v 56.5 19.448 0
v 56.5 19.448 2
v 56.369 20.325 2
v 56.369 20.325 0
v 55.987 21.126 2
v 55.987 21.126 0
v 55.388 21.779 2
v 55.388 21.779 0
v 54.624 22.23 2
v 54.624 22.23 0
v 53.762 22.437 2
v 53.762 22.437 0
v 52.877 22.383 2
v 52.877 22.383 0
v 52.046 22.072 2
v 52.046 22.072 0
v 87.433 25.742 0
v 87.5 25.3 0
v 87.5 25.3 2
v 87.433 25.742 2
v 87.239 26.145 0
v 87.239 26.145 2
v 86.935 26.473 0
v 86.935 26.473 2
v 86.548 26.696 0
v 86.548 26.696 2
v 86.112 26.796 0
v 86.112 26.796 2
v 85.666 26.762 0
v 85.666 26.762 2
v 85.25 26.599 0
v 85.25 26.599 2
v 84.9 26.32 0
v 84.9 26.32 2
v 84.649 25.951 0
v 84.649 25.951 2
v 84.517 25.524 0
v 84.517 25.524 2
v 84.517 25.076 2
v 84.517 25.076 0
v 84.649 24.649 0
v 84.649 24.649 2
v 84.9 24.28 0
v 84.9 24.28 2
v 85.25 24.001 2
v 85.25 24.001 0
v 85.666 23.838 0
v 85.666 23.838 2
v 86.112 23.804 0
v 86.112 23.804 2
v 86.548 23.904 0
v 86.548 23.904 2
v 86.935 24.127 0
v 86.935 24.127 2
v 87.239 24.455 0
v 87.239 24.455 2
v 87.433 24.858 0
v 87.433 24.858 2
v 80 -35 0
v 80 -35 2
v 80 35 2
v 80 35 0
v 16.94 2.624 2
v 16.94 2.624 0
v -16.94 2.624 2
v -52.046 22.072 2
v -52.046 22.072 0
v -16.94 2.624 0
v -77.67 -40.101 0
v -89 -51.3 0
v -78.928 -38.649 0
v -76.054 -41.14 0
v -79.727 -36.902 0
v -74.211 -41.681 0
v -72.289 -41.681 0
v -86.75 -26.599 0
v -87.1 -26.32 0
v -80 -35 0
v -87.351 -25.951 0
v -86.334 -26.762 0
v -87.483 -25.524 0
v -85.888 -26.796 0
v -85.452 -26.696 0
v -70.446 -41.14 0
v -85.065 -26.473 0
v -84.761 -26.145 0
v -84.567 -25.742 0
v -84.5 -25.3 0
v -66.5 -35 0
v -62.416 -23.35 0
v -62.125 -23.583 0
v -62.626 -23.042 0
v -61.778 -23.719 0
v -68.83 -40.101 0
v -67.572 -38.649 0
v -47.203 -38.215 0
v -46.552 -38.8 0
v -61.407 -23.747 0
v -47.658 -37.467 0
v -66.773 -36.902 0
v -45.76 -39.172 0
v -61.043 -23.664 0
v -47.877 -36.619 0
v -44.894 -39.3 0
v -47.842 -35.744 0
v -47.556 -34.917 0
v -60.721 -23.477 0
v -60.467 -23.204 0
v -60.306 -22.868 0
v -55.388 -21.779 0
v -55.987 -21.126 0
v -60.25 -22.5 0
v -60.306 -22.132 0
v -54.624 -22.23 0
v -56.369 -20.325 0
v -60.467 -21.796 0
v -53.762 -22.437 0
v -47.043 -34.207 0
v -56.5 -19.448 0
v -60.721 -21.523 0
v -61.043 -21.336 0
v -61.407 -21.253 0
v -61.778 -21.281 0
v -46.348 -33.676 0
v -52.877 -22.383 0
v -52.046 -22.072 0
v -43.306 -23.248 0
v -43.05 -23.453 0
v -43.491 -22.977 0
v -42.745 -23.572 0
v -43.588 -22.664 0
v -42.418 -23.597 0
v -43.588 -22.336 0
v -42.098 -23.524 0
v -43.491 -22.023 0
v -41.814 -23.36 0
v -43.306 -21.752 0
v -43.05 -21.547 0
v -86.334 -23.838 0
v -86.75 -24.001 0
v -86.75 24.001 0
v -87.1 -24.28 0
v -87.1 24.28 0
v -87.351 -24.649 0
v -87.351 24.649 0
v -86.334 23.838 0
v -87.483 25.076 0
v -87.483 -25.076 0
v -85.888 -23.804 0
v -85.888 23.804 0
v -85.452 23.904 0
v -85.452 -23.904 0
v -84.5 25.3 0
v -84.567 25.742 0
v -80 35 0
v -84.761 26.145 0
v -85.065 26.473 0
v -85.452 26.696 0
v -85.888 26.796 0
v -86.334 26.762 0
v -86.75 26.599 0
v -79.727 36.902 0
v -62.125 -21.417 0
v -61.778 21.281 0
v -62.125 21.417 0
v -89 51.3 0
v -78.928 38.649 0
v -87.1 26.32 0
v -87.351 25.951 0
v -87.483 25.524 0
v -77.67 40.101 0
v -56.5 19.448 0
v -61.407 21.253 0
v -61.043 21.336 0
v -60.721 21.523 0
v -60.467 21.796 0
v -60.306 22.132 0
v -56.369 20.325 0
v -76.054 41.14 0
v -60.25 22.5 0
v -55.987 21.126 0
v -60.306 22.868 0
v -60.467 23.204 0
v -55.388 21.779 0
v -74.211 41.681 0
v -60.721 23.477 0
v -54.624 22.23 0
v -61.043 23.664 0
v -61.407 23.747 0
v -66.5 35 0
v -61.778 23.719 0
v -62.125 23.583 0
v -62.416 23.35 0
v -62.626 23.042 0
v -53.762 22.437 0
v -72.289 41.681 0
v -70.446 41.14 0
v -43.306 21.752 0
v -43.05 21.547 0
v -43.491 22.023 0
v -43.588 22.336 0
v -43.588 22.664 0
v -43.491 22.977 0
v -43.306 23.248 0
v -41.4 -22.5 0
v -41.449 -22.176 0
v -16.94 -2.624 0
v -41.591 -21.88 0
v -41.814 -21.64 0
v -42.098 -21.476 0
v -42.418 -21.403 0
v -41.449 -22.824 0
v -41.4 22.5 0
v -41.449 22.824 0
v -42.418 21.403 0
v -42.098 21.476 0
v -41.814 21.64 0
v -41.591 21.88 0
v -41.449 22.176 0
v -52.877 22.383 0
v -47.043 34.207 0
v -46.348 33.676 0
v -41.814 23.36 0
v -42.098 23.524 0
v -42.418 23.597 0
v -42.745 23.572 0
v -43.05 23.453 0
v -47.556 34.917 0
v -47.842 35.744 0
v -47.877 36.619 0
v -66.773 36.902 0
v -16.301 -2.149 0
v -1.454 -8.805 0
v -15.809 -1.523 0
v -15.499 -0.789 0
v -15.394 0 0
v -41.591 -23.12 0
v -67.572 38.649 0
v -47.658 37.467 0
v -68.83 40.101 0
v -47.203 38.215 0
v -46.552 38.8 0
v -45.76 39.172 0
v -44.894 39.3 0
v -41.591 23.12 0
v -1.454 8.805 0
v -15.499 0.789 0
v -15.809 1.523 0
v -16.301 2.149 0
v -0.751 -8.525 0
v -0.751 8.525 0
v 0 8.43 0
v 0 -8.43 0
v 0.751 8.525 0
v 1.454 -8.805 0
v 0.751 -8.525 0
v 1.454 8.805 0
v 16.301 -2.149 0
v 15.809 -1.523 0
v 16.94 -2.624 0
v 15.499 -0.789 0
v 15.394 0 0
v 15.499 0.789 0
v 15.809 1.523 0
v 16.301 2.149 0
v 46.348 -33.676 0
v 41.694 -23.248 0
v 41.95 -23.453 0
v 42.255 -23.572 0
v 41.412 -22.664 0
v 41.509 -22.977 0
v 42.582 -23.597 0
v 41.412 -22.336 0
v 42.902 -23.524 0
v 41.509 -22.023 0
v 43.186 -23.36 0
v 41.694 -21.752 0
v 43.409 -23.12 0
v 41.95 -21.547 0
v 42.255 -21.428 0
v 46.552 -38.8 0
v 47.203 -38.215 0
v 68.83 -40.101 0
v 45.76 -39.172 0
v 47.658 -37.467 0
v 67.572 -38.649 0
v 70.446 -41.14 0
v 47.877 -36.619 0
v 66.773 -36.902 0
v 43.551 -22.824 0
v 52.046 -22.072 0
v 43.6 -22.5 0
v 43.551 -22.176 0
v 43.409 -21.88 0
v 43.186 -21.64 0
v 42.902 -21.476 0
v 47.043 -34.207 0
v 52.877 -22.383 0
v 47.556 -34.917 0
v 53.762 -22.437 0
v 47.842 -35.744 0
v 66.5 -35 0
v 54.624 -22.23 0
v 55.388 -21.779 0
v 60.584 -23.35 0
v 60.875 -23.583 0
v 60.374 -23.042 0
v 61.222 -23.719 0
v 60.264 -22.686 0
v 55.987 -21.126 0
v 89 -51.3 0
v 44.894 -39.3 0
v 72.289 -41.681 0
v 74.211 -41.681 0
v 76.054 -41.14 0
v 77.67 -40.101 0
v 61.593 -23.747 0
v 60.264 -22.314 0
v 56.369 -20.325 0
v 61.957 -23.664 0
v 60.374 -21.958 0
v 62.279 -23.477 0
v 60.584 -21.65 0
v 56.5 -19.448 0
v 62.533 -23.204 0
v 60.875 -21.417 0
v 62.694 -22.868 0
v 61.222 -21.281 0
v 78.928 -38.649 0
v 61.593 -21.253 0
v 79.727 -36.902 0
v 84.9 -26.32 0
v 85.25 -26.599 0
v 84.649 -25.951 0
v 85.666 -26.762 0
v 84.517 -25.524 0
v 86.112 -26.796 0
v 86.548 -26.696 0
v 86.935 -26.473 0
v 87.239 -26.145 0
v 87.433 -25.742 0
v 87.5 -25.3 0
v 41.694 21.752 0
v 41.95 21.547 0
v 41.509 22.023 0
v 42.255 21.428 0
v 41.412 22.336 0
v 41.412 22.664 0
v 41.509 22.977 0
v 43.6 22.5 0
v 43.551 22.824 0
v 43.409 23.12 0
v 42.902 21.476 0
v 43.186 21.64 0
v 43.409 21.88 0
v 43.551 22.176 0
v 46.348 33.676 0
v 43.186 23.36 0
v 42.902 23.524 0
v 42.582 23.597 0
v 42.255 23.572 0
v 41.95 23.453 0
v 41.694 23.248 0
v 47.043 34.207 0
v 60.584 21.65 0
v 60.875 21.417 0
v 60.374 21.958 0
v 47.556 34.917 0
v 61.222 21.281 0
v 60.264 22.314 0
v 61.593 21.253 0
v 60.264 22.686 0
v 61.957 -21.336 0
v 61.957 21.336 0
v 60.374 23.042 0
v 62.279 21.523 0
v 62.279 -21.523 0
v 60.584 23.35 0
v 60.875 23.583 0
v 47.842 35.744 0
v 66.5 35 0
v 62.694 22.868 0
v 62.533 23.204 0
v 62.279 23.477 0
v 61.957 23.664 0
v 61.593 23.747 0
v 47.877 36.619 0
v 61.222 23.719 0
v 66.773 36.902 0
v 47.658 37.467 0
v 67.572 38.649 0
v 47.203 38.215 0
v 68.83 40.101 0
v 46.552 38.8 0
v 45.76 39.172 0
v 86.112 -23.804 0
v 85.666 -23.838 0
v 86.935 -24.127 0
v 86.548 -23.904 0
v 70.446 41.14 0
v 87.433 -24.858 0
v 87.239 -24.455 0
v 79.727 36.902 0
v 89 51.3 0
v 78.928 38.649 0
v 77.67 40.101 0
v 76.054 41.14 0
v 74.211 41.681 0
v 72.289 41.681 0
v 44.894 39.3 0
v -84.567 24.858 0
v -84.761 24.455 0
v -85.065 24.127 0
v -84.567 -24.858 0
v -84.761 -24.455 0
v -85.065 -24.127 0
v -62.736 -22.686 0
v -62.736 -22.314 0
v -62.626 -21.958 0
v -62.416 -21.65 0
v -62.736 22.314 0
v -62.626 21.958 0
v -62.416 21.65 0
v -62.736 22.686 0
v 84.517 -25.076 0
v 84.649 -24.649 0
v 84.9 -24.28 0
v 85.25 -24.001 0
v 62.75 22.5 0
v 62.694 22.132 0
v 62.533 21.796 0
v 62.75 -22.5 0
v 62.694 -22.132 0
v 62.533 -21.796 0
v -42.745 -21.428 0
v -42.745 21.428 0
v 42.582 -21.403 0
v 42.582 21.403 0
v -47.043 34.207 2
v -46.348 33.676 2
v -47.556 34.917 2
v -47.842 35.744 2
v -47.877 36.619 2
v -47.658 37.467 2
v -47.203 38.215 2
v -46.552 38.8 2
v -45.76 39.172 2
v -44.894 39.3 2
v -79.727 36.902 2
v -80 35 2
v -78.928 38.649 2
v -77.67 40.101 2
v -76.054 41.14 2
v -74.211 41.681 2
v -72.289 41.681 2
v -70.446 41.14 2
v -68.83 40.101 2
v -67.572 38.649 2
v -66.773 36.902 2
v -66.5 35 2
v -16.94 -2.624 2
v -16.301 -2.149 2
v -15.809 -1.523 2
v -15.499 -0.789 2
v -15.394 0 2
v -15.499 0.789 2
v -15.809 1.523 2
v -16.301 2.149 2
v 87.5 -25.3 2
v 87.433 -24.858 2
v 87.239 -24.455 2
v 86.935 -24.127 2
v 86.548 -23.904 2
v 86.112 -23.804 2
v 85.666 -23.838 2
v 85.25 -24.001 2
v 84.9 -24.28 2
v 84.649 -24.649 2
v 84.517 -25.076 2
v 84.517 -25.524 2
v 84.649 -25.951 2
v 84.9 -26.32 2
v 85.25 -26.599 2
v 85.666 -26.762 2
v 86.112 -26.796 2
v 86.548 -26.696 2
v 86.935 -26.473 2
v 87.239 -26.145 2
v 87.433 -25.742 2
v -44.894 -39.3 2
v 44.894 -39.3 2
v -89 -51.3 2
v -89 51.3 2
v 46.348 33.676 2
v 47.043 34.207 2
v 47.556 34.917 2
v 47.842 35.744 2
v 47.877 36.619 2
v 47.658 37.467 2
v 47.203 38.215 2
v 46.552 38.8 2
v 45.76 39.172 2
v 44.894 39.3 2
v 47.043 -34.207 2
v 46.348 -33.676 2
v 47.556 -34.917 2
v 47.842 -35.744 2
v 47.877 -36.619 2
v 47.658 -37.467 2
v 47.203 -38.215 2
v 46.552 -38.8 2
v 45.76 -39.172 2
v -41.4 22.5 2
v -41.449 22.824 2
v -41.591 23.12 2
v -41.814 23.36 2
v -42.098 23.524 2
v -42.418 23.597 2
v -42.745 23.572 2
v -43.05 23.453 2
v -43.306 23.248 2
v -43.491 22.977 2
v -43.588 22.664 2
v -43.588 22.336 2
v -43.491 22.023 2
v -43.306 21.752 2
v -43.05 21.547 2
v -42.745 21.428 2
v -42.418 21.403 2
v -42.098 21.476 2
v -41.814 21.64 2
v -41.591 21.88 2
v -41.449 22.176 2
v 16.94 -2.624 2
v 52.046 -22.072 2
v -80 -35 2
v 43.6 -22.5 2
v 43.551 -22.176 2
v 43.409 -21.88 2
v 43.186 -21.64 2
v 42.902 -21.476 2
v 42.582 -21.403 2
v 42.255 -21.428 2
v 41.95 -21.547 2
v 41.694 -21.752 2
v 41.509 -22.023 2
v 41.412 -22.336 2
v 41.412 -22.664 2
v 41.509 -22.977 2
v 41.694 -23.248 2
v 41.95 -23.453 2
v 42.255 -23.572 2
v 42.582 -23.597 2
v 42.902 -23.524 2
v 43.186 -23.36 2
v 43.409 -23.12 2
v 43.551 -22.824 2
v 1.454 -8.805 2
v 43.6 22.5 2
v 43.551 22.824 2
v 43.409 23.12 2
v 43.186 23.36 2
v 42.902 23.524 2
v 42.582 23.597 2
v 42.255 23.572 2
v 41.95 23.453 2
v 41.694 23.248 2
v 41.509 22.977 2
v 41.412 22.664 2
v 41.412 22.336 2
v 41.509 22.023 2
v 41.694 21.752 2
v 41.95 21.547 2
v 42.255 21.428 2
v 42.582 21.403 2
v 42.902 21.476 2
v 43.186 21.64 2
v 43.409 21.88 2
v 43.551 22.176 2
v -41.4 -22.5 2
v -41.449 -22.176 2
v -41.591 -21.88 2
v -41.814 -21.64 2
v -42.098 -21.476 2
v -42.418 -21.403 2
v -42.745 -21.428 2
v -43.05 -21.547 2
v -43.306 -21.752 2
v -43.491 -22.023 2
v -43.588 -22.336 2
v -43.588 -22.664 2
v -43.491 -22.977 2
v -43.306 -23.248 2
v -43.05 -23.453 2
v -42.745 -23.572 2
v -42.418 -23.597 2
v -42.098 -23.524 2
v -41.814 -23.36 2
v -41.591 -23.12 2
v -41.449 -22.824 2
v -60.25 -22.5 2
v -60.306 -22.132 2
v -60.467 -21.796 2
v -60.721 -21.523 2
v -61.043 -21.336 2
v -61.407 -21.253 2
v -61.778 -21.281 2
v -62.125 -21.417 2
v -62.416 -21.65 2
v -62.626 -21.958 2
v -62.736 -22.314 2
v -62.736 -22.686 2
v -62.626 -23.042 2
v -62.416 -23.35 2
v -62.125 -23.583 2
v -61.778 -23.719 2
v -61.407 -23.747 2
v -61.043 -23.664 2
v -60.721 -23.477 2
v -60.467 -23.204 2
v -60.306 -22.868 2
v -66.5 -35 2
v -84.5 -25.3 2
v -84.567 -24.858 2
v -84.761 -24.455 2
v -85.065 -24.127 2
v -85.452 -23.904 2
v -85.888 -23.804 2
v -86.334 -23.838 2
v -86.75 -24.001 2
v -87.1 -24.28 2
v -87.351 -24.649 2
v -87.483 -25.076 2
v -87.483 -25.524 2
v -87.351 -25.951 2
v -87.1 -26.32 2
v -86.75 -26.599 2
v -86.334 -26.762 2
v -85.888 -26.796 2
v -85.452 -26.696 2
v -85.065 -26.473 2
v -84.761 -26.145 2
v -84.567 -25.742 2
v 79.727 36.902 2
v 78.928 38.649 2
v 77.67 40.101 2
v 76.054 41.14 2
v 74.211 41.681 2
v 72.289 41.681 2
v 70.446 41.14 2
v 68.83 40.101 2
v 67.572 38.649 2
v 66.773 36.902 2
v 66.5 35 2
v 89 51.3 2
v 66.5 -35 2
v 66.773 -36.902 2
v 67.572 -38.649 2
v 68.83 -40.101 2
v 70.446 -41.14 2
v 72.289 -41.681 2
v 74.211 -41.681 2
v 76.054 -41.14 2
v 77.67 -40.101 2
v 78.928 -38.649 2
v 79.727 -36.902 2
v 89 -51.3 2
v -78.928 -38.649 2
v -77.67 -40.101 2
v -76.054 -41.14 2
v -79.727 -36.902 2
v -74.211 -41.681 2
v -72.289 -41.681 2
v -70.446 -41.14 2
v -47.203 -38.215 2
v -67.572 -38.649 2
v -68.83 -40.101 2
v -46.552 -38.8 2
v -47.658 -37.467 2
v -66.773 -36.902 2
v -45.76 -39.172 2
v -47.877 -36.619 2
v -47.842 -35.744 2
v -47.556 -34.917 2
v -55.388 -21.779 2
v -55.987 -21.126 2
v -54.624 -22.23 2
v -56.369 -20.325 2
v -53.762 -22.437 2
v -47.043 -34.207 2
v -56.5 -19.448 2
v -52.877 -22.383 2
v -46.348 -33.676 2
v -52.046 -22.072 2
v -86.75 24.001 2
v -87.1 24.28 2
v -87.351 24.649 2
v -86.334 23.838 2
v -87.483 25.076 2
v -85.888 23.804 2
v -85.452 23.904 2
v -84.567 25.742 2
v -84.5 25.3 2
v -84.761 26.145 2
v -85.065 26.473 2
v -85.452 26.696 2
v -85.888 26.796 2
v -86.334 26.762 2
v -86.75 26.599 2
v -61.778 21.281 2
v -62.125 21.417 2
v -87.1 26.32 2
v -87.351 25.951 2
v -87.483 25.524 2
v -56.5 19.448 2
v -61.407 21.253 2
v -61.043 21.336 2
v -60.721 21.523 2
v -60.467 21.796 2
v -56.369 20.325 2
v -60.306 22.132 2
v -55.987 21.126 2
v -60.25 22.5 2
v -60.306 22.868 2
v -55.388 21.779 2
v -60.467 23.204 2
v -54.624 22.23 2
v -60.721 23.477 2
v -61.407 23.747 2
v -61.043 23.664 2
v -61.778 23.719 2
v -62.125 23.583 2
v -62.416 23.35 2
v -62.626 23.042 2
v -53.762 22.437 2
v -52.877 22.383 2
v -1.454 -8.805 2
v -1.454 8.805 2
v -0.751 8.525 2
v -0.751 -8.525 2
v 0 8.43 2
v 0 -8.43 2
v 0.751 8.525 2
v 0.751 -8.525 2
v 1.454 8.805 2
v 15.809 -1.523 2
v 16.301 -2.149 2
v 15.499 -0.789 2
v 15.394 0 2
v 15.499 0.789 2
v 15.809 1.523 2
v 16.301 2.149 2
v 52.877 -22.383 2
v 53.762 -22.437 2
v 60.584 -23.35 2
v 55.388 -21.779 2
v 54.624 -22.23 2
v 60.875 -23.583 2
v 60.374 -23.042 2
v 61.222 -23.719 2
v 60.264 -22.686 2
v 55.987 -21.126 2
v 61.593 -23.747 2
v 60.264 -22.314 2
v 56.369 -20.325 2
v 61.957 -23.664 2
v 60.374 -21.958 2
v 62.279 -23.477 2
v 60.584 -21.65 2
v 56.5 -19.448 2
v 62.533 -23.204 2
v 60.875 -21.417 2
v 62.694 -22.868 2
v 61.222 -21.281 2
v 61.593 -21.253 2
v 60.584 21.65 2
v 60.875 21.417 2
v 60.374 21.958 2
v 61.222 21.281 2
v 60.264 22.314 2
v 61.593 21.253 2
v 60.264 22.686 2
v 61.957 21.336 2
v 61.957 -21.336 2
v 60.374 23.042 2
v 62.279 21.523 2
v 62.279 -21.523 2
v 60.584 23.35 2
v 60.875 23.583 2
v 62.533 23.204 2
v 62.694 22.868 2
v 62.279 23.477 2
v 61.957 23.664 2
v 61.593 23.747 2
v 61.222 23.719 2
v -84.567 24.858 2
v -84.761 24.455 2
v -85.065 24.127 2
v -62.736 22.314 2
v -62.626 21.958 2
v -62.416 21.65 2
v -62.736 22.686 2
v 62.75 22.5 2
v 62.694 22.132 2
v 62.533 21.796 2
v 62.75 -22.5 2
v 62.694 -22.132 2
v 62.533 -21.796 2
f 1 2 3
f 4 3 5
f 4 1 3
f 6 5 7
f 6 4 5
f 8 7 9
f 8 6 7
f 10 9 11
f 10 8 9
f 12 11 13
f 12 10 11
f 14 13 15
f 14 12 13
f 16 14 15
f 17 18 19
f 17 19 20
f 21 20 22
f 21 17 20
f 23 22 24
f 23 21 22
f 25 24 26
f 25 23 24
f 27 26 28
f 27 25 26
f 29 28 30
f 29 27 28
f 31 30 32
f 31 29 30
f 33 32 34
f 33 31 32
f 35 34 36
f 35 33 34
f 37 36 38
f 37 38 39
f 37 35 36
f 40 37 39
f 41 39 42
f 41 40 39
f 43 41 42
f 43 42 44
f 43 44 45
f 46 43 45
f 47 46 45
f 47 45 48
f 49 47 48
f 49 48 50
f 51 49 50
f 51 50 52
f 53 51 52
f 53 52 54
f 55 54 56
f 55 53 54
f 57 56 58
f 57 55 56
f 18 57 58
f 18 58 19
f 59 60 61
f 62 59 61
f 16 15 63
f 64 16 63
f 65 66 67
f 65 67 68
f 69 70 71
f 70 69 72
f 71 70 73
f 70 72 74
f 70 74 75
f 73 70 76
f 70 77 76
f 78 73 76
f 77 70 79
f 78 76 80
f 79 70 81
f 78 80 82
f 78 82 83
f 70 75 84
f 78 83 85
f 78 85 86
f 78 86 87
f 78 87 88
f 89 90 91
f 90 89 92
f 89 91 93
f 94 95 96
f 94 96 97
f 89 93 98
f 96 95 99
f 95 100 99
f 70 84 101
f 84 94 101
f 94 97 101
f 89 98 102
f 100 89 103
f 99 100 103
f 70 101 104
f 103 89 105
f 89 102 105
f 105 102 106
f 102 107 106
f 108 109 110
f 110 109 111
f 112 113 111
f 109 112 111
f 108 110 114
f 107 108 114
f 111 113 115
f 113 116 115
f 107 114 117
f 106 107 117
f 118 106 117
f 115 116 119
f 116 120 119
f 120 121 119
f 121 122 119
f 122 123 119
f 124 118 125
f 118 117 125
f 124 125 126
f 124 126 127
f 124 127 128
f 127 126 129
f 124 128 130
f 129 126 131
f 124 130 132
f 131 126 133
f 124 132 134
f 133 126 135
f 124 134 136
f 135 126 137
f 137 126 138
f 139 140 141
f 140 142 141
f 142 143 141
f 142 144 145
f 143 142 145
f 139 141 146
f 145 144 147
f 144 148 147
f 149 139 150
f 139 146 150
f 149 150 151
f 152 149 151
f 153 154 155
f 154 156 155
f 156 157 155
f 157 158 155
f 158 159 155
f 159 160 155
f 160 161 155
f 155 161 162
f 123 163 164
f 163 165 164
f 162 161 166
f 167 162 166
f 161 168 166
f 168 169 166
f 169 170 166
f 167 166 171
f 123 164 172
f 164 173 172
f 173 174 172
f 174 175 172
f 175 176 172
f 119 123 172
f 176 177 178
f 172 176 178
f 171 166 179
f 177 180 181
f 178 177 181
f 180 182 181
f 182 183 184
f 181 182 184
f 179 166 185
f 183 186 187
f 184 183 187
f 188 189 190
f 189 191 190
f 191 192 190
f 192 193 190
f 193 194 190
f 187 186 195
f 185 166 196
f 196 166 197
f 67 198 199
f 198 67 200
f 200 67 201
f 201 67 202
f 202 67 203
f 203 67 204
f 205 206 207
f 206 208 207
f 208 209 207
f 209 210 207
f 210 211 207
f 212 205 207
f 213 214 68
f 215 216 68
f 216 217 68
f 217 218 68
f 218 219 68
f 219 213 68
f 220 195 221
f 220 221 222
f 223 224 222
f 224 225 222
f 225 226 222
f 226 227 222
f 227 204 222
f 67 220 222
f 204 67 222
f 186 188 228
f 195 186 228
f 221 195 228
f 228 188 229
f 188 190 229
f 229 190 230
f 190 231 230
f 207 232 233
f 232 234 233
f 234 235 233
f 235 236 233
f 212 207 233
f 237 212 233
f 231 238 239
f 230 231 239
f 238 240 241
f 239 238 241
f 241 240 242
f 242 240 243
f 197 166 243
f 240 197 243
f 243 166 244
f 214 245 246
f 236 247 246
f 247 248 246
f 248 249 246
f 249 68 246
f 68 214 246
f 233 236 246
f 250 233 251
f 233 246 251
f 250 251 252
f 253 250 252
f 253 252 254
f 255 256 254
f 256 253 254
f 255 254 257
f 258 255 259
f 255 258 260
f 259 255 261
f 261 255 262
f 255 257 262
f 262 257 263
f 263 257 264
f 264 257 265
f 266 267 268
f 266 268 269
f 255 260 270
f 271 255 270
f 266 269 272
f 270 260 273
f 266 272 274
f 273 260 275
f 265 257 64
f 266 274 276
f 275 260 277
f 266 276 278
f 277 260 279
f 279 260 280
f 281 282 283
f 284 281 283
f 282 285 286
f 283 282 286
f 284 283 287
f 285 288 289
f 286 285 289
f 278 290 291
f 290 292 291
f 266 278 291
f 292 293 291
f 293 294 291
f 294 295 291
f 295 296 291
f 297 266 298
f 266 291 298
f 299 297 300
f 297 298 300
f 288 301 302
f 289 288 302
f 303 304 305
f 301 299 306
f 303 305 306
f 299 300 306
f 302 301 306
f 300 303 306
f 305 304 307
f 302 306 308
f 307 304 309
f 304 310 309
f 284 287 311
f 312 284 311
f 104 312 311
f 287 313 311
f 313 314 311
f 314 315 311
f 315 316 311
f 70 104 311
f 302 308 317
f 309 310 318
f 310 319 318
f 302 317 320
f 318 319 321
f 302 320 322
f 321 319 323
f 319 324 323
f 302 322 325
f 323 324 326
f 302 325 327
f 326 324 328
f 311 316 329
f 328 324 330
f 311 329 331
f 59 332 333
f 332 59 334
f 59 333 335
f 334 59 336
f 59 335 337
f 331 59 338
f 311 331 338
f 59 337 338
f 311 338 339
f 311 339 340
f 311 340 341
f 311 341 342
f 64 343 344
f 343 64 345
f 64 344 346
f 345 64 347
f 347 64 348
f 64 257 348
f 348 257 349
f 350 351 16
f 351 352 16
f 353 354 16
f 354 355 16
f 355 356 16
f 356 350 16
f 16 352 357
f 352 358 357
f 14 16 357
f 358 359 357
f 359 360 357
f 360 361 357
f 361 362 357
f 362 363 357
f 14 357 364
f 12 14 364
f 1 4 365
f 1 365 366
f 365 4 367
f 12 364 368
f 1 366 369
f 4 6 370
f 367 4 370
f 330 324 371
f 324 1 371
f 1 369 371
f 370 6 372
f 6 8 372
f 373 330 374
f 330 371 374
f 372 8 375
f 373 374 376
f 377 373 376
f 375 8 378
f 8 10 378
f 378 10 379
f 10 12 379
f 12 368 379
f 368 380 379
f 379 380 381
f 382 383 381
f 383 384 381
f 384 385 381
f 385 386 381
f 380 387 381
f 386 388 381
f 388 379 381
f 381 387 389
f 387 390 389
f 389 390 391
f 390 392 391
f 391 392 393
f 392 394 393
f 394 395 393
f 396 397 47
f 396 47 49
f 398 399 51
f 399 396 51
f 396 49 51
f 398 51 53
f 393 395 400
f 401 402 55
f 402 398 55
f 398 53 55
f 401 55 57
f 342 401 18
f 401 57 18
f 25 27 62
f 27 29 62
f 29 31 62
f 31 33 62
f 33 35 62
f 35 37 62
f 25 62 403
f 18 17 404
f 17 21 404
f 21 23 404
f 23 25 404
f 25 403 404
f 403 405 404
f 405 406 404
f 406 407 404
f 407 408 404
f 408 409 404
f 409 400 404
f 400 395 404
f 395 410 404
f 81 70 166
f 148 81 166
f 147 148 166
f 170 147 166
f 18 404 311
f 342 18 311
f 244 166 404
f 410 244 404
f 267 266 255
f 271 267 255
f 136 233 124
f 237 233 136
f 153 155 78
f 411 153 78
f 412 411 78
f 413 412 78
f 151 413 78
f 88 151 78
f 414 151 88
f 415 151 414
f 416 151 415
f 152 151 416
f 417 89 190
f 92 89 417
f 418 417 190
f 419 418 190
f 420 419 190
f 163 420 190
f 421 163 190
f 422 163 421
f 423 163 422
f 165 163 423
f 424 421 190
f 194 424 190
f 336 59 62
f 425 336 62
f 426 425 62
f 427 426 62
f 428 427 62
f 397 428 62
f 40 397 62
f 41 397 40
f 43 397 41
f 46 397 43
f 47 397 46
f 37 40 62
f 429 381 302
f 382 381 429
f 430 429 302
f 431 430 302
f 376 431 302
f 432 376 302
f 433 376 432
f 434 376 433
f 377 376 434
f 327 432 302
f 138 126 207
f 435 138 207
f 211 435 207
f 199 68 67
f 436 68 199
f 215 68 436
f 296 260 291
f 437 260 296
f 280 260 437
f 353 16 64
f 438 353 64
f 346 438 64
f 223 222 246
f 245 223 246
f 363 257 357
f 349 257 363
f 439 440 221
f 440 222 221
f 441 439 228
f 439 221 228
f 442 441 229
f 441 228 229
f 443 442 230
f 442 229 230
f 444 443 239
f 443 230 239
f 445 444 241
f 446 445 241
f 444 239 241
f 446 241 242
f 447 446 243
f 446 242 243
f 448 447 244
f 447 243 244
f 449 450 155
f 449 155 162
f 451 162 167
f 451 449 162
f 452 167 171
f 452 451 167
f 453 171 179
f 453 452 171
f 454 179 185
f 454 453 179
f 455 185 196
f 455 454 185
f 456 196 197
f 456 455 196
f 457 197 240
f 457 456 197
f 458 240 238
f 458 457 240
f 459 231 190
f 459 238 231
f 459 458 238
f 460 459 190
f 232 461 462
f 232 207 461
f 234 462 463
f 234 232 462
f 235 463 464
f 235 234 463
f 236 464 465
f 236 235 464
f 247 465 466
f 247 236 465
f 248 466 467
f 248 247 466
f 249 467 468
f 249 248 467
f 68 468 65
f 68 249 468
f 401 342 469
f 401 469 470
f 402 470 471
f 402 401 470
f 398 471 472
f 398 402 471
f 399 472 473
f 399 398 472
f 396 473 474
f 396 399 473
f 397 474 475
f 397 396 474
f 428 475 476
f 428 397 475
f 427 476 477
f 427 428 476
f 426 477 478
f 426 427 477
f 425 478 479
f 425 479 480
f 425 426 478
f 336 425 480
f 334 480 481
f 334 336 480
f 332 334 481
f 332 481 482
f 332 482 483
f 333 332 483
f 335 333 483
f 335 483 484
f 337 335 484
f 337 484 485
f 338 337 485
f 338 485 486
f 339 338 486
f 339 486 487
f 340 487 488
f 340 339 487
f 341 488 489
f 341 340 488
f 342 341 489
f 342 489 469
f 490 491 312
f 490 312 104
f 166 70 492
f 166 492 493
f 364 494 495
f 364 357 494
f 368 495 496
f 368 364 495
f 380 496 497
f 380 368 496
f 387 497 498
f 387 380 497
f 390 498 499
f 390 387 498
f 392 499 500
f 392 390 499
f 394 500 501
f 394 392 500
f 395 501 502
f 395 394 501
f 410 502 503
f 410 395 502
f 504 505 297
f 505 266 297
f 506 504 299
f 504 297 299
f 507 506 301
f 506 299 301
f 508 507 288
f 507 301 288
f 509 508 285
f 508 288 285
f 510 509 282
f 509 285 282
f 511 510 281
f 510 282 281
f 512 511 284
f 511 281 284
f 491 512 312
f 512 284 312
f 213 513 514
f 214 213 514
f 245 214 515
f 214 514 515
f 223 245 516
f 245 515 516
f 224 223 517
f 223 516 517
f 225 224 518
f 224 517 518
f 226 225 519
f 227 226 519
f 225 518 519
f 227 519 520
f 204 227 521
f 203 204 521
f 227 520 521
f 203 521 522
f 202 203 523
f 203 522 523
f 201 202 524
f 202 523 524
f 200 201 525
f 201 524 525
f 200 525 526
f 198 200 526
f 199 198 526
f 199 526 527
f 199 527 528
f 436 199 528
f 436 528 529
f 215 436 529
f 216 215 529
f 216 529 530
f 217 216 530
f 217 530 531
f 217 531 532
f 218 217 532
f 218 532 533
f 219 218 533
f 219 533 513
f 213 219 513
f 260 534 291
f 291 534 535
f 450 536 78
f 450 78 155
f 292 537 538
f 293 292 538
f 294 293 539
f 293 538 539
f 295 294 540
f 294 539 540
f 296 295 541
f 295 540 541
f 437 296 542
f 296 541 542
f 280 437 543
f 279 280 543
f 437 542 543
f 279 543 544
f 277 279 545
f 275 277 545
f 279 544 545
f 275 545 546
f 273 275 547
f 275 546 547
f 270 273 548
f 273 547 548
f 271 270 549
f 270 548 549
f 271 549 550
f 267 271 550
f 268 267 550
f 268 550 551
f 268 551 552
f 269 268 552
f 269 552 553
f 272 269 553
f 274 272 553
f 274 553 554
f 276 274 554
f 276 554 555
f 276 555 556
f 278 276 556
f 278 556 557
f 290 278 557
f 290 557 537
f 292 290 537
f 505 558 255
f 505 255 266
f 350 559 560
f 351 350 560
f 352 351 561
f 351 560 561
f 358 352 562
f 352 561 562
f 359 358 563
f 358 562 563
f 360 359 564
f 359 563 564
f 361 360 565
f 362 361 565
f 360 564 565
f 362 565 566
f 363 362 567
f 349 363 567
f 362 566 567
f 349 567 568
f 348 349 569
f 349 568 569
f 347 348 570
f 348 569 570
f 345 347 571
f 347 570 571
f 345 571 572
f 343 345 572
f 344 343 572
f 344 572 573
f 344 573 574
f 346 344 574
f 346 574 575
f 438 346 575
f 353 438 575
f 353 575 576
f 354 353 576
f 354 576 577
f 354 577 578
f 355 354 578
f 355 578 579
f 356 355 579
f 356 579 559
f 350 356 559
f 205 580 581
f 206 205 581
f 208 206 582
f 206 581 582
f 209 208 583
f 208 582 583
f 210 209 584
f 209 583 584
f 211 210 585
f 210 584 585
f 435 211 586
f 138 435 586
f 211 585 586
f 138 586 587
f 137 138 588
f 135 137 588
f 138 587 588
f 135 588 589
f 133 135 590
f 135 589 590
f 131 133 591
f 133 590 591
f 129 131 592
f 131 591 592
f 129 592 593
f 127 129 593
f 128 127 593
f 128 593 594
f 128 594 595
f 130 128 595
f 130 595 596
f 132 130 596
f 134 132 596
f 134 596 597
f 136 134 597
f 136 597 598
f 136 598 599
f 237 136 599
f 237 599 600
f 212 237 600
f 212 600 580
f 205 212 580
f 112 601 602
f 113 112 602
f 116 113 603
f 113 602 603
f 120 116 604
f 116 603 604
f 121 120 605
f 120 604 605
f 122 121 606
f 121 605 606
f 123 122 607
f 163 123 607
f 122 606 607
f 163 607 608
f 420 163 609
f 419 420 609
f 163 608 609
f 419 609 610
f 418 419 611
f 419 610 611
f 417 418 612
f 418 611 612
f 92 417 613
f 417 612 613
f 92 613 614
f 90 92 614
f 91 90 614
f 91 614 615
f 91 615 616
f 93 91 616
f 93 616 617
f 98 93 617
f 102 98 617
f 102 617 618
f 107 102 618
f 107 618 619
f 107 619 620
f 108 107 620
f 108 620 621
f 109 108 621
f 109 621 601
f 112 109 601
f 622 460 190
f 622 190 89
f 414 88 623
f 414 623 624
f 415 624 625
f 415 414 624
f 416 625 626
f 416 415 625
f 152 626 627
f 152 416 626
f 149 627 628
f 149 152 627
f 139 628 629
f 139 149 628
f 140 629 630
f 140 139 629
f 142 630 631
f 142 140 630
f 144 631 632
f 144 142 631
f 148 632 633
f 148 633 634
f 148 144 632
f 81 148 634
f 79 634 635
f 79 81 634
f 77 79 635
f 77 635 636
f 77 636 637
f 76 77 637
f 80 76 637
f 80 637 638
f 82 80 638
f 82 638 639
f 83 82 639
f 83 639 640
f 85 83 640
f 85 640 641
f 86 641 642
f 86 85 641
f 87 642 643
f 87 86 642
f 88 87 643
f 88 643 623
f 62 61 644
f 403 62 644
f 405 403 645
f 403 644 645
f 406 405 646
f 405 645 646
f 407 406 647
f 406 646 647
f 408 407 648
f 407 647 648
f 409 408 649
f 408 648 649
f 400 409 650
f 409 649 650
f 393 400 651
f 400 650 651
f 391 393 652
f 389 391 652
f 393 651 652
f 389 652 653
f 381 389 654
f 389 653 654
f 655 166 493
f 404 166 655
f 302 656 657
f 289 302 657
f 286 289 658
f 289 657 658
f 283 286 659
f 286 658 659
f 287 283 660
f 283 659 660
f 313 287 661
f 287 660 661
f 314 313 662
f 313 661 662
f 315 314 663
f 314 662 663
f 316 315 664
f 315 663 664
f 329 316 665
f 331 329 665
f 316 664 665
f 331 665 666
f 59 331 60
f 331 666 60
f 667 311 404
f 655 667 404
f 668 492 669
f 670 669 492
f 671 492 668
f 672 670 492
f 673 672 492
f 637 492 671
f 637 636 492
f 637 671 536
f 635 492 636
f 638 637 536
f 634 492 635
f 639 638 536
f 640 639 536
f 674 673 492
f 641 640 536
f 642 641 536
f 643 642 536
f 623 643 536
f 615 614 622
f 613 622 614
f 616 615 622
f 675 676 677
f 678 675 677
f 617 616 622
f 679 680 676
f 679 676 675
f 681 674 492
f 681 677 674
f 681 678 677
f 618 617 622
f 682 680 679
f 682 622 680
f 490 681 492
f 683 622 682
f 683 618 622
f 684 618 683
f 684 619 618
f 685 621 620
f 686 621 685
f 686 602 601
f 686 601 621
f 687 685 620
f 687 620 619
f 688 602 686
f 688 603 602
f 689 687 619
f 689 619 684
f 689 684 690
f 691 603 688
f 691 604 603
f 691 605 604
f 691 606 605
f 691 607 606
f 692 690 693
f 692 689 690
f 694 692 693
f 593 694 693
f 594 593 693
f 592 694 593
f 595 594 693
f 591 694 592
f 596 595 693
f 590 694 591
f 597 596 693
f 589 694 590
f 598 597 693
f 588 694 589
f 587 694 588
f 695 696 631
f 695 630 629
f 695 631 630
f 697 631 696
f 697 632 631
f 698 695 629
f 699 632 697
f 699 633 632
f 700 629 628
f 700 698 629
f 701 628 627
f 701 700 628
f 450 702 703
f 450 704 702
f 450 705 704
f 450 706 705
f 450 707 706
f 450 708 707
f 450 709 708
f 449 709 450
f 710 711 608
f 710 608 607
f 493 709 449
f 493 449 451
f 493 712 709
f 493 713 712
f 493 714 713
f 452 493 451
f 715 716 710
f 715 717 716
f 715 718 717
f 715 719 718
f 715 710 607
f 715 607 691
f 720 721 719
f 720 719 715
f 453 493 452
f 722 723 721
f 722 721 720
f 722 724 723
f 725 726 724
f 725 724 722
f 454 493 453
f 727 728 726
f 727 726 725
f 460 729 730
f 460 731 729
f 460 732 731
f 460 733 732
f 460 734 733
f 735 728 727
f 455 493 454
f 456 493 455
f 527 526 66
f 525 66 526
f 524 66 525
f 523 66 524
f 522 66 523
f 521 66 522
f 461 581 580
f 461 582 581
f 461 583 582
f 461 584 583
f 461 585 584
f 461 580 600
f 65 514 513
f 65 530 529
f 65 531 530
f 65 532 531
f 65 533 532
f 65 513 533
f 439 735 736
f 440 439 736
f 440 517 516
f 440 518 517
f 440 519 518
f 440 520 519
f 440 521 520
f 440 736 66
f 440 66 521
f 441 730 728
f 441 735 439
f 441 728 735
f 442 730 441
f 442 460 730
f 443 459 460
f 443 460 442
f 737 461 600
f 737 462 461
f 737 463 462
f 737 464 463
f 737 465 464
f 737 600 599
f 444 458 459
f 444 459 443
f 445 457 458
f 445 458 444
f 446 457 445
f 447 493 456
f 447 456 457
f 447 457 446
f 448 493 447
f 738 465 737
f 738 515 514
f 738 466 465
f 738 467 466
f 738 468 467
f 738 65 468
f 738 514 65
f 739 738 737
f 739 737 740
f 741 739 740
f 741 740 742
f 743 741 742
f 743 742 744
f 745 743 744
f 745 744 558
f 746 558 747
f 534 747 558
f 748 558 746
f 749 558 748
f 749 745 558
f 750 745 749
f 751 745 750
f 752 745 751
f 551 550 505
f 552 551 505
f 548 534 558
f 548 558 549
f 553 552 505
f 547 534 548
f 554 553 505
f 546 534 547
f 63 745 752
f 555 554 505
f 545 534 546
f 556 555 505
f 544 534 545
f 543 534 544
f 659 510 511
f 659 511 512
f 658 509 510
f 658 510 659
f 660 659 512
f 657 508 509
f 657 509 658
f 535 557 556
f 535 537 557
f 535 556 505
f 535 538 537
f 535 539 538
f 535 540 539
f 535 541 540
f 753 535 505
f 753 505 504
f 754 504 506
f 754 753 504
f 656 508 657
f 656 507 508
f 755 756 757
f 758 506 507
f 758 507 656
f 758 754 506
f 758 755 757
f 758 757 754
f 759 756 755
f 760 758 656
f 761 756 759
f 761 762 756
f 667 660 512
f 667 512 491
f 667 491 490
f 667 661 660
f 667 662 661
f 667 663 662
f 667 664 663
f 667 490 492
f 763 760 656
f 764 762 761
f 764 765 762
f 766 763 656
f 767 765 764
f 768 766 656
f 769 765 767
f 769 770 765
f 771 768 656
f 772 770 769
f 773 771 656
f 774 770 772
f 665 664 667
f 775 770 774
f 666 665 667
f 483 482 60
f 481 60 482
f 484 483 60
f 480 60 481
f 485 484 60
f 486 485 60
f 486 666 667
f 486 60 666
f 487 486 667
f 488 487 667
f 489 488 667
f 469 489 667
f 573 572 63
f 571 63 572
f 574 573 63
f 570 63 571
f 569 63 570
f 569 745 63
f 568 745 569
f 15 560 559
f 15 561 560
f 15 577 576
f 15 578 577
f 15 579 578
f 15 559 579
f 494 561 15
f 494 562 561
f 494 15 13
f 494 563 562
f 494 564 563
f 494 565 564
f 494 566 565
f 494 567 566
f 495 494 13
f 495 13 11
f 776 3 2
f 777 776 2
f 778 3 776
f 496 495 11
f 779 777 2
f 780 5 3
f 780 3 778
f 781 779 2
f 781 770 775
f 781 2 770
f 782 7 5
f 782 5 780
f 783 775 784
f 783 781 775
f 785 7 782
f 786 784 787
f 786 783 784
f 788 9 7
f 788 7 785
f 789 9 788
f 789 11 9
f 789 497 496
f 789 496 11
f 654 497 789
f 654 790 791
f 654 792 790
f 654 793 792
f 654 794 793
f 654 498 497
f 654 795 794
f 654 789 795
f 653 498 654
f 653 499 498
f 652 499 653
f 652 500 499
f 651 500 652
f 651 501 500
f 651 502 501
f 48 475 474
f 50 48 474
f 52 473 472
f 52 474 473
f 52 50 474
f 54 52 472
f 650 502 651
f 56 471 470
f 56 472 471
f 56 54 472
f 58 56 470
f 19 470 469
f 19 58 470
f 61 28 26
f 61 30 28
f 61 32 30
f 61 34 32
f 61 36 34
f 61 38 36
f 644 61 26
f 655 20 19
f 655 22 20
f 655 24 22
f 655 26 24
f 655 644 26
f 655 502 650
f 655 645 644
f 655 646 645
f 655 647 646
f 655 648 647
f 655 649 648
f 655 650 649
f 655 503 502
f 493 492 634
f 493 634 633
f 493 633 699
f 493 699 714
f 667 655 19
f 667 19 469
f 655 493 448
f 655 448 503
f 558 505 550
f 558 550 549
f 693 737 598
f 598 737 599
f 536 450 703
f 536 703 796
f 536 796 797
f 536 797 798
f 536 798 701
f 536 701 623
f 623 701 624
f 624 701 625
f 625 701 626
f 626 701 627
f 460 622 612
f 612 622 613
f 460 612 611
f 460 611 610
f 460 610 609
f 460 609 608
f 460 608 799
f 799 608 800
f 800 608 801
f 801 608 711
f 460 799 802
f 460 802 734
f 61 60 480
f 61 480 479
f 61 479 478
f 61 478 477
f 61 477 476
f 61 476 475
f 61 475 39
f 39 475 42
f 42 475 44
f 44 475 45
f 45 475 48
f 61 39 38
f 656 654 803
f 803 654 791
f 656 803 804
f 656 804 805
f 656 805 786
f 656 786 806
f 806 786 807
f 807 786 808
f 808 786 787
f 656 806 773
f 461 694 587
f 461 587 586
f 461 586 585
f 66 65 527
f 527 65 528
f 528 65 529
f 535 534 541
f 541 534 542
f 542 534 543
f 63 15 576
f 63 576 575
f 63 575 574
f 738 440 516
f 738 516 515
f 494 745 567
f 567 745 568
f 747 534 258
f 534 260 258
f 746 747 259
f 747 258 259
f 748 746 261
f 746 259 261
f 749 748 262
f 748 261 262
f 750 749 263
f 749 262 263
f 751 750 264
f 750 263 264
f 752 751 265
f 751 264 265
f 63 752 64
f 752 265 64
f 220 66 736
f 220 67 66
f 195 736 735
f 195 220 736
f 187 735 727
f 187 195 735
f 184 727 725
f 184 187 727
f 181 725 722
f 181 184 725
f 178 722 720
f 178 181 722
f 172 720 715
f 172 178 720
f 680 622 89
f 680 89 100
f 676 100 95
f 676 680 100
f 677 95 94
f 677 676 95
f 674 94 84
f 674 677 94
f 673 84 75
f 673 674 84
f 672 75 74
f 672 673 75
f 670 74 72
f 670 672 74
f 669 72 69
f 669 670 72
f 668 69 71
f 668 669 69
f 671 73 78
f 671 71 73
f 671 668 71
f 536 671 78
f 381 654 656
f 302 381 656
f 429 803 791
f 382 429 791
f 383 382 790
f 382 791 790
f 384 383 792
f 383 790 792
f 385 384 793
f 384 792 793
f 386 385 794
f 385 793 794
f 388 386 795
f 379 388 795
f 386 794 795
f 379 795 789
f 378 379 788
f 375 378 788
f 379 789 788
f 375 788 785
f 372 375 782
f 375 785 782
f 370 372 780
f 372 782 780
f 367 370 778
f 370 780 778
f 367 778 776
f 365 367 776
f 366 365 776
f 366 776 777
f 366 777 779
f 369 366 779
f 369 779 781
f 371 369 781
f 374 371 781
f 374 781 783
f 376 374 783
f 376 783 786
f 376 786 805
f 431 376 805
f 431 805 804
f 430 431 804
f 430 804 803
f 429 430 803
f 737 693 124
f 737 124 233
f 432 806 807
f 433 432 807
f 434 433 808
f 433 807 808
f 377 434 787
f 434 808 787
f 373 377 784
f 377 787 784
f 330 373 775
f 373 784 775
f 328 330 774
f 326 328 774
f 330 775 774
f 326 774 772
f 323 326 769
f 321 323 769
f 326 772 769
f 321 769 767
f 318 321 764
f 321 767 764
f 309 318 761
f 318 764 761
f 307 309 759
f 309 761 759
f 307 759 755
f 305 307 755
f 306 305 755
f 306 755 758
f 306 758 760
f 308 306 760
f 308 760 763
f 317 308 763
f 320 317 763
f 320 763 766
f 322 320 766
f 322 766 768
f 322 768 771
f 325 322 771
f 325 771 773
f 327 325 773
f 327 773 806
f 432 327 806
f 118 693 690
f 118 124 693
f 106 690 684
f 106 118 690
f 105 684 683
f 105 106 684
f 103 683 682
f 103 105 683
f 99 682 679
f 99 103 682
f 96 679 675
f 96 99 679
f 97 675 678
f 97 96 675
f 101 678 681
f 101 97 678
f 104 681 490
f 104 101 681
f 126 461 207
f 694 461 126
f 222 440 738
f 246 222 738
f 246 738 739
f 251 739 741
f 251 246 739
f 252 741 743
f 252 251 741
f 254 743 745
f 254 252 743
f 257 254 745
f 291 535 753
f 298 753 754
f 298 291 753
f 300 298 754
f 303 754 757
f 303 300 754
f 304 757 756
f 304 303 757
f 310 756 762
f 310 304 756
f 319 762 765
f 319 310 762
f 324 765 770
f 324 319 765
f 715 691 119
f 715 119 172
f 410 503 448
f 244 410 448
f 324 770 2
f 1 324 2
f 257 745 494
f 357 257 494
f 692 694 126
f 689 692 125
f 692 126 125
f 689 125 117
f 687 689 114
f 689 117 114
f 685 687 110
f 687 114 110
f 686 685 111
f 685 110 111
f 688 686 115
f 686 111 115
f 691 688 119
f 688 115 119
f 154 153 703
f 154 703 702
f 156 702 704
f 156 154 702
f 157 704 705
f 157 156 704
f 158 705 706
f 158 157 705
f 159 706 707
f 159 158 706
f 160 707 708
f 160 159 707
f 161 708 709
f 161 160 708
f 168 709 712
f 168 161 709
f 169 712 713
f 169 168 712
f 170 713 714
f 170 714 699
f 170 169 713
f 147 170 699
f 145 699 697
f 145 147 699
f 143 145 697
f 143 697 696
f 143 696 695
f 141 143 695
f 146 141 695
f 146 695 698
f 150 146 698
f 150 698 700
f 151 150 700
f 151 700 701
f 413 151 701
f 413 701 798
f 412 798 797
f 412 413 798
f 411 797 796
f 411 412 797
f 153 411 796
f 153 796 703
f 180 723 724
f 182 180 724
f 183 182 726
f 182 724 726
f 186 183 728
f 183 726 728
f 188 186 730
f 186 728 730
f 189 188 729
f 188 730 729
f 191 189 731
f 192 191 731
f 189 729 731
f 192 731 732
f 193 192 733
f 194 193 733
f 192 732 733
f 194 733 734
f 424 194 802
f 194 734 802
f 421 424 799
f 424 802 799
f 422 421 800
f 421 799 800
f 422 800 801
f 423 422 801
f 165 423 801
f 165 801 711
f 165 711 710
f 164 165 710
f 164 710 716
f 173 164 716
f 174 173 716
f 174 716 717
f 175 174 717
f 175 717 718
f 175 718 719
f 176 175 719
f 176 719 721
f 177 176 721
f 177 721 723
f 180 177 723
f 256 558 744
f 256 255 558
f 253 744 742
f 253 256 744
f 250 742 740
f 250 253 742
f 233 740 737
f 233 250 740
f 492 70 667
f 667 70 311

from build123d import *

# Parameters (mm, degrees)
SKETCH_1_W          = 178
SKETCH_1_H          = 102.6
SKETCH_1_R          = 1.5
EXTRUDE_1_DEPTH     = 2
SKETCH_3_R          = 1.25
SKETCH_3_R_2        = 1.1
CUT_EXTRUDE_1_DEPTH = 103.74575417
CUT_EXTRUDE_2_DEPTH = 103.74575417
FILLET_1_R          = 3


with BuildPart() as part:
    # 草图1 → 凸台-拉伸1 (new body)
    with BuildSketch(Plane.XY):
        Rectangle(SKETCH_1_W, SKETCH_1_H)
        with Locations((-86, 25.3)):
            Circle(SKETCH_1_R, mode=Mode.SUBTRACT)
        with Locations((-86, -25.3)):
            Circle(SKETCH_1_R, mode=Mode.SUBTRACT)
        with Locations((86, 25.3)):
            Circle(SKETCH_1_R, mode=Mode.SUBTRACT)
        with Locations((86, -25.3)):
            Circle(SKETCH_1_R, mode=Mode.SUBTRACT)
    extrude(amount=EXTRUDE_1_DEPTH)

    # 草图3 → 切除-拉伸1 (cut, through all)
    with BuildSketch(Plane.XY.offset(2)):
        with Locations((-61.5, -22.5)):
            Circle(SKETCH_3_R)
        with Locations((-61.5, 22.5)):
            Circle(SKETCH_3_R)
        with Locations((61.5, -22.5)):
            Circle(SKETCH_3_R)
        with Locations((61.5, 22.5)):
            Circle(SKETCH_3_R)
        with Locations((-42.5, -22.5)):
            Circle(SKETCH_3_R_2)
        with Locations((-42.5, 22.5)):
            Circle(SKETCH_3_R_2)
        with Locations((42.5, 22.5)):
            Circle(SKETCH_3_R_2)
        with Locations((42.5, -22.5)):
            Circle(SKETCH_3_R_2)
    extrude(amount=-CUT_EXTRUDE_1_DEPTH, mode=Mode.SUBTRACT)

    # 草图4 → 切除-拉伸2 (cut, through all)
    with BuildSketch(Plane.XY.offset(2)):
        with BuildLine():
            Line((-80, -35), (-80, 35))
            ThreePointArc((-80, 35), (-73.25, 41.75), (-66.5, 35))
            Line((-66.5, 35), (-66.5, -35))
            ThreePointArc((-66.5, -35), (-73.25, -41.75), (-80, -35))
        make_face()
        with BuildLine():
            Line((80, -35), (80, 35))
            ThreePointArc((80, 35), (73.25, 41.75), (66.5, 35))
            Line((66.5, 35), (66.5, -35))
            ThreePointArc((66.5, -35), (73.25, -41.75), (80, -35))
        make_face()
        Polygon((-56.5, -24.539773754), (-56.5, 24.539773754), (-12.202964311, 0), align=None)
        Polygon((-56.5, 39.3), (0, 8), (56.5, 39.3), align=None)
        Polygon((56.5, -39.3), (-56.5, -39.3), (0, -8), align=None)
        Polygon((12.202964311, 0), (56.5, -24.539773754), (56.5, 24.539773754), align=None)
    extrude(amount=-CUT_EXTRUDE_2_DEPTH, mode=Mode.SUBTRACT)

    # 圆角1
    fillet_1_edges = [part.edges().sort_by_distance(p)[0] for p in [
        (12.202964311, 0, 1),
        (56.5, 24.539773754, 1),
        (56.5, -24.539773754, 1),
        (56.5, 39.3, 1),
        (0, 8, 1),
        (-56.5, 39.3, 1),
        (-12.202964311, 0, 1),
        (-56.5, -24.539773754, 1),
        (-56.5, 24.539773754, 1),
        (-56.5, -39.3, 1),
        (0, -8, 1),
        (56.5, -39.3, 1),
    ]]
    fillet(fillet_1_edges, radius=FILLET_1_R)


solid = part.part
